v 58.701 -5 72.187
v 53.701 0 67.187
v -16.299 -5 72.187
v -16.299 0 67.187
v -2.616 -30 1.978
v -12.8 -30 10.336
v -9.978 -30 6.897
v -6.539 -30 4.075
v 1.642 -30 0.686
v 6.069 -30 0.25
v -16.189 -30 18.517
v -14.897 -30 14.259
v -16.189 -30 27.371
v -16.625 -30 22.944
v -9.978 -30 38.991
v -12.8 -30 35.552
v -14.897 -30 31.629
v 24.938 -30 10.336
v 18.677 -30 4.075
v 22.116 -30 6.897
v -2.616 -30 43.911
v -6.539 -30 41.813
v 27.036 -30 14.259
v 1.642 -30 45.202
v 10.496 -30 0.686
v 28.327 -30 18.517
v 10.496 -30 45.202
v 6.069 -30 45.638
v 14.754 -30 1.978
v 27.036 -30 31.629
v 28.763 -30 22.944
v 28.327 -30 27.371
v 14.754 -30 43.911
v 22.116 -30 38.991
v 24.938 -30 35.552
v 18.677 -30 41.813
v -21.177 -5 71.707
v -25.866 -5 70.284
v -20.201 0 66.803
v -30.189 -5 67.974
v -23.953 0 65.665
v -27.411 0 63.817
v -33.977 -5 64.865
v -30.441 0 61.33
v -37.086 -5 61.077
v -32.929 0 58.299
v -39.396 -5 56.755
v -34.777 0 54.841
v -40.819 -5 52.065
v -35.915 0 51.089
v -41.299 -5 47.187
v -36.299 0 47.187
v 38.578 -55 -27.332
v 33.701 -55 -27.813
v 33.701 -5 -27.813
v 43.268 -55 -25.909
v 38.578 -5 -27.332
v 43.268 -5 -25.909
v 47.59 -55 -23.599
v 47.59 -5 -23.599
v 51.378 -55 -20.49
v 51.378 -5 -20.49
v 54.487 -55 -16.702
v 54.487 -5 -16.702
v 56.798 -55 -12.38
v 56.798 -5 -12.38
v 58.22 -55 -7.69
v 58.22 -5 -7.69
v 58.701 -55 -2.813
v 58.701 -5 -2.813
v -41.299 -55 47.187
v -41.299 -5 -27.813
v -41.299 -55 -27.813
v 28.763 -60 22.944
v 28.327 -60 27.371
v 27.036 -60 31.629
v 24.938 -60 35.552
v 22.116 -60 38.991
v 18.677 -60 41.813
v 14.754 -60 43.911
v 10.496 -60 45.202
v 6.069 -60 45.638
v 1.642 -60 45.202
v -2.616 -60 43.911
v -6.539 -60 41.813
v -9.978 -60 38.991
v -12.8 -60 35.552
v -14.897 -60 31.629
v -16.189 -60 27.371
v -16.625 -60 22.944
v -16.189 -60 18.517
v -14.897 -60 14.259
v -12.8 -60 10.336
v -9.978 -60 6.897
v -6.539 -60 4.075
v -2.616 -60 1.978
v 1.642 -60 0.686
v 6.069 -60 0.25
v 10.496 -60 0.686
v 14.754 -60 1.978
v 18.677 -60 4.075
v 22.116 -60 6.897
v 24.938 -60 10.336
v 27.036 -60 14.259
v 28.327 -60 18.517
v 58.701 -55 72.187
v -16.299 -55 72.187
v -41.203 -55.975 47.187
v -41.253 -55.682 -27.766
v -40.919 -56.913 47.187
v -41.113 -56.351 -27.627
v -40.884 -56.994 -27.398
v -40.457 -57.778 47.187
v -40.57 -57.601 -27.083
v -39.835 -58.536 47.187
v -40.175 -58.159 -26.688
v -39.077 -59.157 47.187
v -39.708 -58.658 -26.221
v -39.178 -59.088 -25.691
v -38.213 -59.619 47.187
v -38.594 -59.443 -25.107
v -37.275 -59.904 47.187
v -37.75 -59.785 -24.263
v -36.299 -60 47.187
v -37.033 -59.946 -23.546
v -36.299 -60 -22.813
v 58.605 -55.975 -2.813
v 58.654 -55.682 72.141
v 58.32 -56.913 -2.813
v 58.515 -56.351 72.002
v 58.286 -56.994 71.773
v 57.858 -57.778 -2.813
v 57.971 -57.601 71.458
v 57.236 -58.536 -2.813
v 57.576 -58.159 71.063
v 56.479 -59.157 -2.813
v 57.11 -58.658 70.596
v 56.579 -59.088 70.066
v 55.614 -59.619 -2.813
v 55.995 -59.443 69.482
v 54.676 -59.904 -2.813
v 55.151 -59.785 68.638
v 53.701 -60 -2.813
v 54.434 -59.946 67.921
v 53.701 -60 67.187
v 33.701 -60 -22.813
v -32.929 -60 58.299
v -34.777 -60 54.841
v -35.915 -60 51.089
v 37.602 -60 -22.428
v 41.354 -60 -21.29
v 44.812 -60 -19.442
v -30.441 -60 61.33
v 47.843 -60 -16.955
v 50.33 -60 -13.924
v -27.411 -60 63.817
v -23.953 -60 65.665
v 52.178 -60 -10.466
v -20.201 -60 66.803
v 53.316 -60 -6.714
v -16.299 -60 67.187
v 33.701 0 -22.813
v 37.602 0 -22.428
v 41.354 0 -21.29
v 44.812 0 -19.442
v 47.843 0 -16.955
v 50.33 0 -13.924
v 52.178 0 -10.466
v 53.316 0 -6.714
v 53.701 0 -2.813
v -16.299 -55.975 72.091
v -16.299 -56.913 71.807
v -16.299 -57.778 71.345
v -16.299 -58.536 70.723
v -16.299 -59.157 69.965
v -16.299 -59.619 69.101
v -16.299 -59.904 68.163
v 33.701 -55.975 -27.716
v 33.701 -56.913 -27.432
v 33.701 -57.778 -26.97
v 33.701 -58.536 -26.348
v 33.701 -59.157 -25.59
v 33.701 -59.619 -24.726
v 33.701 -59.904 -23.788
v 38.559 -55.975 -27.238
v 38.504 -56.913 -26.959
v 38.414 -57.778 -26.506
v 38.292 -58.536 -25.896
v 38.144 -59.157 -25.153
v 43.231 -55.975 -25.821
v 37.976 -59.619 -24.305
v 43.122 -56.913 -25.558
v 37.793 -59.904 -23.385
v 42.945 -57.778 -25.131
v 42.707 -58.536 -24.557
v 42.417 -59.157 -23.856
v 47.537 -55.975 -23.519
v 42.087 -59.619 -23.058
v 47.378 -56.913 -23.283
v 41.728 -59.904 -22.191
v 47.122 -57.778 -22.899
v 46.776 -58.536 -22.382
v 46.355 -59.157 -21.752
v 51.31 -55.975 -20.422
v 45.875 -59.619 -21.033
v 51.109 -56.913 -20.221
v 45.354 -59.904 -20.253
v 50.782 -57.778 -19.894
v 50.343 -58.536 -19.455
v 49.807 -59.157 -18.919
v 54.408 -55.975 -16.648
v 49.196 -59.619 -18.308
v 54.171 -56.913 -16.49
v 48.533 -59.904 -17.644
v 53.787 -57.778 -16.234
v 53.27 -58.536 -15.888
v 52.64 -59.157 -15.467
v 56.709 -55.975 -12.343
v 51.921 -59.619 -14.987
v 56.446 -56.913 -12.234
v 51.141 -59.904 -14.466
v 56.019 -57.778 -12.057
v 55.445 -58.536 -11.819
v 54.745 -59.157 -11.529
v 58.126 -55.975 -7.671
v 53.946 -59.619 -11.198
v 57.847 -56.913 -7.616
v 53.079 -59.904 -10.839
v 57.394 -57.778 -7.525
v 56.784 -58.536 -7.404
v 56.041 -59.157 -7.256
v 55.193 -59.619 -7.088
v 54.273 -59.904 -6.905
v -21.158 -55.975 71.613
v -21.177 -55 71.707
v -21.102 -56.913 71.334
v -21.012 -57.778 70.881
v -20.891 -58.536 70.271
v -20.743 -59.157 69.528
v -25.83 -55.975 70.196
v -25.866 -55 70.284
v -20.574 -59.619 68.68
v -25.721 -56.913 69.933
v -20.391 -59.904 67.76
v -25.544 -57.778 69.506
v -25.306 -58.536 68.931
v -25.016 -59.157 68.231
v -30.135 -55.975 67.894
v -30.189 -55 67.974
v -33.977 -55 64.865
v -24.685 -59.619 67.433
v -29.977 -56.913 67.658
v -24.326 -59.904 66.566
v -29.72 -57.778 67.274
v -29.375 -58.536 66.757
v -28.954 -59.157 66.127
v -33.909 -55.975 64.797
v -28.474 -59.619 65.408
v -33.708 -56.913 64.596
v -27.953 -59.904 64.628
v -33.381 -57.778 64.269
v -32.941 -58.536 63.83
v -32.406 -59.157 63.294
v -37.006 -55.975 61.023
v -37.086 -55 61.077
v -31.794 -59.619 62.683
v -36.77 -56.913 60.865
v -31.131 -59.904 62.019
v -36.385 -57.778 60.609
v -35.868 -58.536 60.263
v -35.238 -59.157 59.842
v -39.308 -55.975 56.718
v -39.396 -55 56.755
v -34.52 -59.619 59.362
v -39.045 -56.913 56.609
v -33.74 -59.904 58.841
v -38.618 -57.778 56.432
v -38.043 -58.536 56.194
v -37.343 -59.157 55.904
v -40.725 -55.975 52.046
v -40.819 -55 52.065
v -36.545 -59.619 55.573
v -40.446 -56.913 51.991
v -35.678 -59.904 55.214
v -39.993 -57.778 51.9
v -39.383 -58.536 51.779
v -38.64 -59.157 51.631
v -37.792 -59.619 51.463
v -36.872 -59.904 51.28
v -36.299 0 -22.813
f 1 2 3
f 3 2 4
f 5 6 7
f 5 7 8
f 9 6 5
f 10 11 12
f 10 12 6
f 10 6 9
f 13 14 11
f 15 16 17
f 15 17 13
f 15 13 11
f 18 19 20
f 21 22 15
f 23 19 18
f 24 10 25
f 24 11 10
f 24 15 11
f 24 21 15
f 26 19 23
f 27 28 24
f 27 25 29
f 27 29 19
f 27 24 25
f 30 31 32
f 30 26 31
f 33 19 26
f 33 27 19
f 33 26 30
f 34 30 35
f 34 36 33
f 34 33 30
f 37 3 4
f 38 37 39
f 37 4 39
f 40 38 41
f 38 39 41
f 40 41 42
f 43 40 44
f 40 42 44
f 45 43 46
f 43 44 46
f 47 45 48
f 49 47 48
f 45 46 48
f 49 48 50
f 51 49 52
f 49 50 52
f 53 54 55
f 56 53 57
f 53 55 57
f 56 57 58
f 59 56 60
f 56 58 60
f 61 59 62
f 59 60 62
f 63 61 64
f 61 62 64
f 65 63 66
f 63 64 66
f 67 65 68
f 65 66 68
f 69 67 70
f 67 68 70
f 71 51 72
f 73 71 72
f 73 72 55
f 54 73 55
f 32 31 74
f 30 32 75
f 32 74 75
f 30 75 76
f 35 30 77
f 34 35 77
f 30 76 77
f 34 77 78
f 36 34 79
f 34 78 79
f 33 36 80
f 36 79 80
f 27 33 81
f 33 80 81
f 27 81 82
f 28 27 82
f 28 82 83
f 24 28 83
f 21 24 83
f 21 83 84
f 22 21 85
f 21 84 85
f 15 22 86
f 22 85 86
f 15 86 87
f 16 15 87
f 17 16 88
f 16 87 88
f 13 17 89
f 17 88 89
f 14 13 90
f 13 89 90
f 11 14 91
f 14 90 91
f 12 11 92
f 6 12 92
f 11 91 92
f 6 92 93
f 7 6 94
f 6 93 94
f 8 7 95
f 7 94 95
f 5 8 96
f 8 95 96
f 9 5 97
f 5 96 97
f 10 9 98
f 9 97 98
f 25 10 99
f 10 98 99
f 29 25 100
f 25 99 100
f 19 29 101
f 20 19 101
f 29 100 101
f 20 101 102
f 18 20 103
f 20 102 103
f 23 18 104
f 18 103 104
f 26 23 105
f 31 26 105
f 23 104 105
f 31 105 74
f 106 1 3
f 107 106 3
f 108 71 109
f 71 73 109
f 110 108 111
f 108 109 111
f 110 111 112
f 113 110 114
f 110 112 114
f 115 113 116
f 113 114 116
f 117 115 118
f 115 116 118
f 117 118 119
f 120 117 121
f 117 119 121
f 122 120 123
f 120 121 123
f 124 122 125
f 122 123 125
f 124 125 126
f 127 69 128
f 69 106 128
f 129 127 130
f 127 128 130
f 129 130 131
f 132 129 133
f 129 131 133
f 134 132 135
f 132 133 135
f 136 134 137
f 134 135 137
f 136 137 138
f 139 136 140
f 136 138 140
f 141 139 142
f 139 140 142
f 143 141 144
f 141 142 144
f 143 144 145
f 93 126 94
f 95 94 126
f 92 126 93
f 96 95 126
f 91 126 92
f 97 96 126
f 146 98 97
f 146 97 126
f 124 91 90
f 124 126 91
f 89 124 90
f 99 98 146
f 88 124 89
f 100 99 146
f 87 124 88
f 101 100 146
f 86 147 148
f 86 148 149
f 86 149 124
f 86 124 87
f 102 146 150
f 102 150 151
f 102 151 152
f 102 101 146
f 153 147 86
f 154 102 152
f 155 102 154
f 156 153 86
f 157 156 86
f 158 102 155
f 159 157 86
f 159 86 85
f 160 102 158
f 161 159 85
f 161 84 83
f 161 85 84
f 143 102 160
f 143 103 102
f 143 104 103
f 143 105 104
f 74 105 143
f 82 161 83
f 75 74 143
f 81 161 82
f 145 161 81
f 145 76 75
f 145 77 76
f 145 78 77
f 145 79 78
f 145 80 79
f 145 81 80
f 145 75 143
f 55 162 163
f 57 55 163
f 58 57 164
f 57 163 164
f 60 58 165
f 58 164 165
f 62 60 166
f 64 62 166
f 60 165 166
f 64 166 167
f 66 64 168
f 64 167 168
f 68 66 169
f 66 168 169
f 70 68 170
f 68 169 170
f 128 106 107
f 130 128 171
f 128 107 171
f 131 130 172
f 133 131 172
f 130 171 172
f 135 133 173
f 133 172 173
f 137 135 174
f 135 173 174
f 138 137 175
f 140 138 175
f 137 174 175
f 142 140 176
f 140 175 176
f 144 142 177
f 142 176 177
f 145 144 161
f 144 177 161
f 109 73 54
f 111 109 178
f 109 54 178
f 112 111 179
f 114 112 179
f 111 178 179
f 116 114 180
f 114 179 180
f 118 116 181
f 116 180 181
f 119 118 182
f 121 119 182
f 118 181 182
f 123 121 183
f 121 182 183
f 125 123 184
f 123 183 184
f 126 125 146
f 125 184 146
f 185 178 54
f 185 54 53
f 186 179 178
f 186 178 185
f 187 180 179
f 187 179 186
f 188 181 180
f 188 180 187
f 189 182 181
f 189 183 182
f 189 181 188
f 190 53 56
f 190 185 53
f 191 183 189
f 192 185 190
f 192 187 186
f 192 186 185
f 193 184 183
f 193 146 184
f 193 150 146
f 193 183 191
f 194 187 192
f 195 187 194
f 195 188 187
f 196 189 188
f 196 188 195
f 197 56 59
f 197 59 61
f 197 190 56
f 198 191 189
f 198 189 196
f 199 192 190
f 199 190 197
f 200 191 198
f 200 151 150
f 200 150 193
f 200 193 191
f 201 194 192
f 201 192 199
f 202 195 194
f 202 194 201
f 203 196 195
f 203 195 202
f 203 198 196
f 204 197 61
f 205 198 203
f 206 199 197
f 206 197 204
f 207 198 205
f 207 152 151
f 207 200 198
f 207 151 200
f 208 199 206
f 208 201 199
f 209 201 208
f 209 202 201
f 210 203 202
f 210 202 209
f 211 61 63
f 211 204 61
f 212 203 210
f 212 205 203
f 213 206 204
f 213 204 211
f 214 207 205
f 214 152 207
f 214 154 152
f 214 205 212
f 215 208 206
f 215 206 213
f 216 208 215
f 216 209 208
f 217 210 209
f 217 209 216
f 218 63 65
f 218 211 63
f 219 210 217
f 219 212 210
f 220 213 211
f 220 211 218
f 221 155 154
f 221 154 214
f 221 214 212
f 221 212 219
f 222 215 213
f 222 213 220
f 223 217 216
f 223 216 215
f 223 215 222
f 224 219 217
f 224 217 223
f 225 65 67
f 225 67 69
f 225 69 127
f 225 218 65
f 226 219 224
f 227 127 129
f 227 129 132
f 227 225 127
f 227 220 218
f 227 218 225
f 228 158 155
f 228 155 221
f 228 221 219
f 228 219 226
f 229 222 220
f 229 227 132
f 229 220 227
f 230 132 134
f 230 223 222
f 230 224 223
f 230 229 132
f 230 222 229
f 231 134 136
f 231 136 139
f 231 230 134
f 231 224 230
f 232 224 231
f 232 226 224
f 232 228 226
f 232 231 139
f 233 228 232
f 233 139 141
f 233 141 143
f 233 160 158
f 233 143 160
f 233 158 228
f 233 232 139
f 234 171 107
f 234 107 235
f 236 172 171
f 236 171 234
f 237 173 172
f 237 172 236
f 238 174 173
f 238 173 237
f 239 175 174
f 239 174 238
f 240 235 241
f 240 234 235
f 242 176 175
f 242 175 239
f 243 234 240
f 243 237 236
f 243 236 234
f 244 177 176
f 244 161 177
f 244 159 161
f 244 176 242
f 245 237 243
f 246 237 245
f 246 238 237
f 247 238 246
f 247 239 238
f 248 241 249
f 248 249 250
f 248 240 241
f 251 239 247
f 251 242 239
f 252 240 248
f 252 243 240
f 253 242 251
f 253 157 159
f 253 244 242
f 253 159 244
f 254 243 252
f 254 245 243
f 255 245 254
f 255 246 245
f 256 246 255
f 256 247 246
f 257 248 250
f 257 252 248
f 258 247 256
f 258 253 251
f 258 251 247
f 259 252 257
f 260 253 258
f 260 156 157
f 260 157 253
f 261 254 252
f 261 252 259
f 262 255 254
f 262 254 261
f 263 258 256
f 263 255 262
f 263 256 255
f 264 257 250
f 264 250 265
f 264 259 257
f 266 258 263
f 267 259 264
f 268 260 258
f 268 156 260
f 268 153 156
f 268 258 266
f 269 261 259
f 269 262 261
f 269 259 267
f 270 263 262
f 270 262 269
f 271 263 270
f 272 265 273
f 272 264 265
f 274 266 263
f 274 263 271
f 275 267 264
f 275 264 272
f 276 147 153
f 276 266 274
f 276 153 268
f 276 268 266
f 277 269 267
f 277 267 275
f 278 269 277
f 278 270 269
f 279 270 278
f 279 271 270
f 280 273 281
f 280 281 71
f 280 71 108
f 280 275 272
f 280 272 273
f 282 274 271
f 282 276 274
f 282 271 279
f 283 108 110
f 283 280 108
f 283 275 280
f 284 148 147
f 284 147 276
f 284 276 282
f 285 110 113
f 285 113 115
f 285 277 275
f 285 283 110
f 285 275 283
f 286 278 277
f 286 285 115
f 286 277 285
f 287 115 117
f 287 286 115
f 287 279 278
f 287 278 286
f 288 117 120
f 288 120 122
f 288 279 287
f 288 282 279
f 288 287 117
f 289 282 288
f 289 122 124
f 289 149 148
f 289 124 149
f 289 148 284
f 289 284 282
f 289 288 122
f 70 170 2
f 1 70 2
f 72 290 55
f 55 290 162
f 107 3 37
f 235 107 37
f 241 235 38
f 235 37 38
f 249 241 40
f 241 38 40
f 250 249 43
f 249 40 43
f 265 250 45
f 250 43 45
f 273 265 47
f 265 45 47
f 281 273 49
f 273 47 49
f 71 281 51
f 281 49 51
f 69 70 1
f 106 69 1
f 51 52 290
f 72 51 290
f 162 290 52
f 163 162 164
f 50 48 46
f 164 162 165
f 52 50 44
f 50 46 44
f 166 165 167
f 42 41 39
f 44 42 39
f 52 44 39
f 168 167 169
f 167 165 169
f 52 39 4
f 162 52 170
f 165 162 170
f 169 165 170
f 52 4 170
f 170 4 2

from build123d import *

# Parameters (mm, degrees)
F1_DEPTH = 60
F2_R     = 5
F3_SIZE  = 5
F4_R     = 22.693936
F5_DEPTH = 30


with BuildPart() as f1:
    # F0 (on Front) → F1 (new body)
    with BuildSketch(Plane.XZ):
        with BuildLine():
            Line((58.700657, 72.187497), (-16.299343, 72.187497))
            ThreePointArc((-16.299343, 72.187497), (-33.977013, 64.865167), (-41.299343, 47.187497))
            Line((-41.299343, 47.187497), (-41.299343, -27.812503))
            Line((-41.299343, -27.812503), (33.700657, -27.812503))
            ThreePointArc((33.700657, -27.812503), (51.378326, -20.490172), (58.700657, -2.812503))
            Line((58.700657, -2.812503), (58.700657, 72.187497))
        make_face()
    extrude(amount=F1_DEPTH)

    # F2
    f2_edges = [f1.edges().sort_by_distance(p)[0] for p in [
        (58.700657, -60, 34.687497),
        (21.200657, -60, 72.187497),
        (-33.977013, -60, 64.865167),
        (-41.299343, -60, 9.687497),
        (-3.799343, -60, -27.812503),
        (51.378326, -60, -20.490172),
    ]]
    fillet(f2_edges, radius=F2_R)

    # F3
    f3_edges = [f1.edges().sort_by_distance(p)[0] for p in [
        (58.700657, 0, 34.687497),
        (21.200657, 0, 72.187497),
        (-33.977013, 0, 64.865167),
        (-41.299343, 0, 9.687497),
        (-3.799343, 0, -27.812503),
        (51.378326, 0, -20.490172),
    ]]
    chamfer(f3_edges, length=F3_SIZE)

    # F4 (on face) → F5 (cut)
    with BuildSketch(Plane.XZ.offset(60)):
        with Locations((6.069079, 22.94408)):
            Circle(F4_R)
    extrude(amount=-F5_DEPTH, mode=Mode.SUBTRACT)


solid = f1.part
